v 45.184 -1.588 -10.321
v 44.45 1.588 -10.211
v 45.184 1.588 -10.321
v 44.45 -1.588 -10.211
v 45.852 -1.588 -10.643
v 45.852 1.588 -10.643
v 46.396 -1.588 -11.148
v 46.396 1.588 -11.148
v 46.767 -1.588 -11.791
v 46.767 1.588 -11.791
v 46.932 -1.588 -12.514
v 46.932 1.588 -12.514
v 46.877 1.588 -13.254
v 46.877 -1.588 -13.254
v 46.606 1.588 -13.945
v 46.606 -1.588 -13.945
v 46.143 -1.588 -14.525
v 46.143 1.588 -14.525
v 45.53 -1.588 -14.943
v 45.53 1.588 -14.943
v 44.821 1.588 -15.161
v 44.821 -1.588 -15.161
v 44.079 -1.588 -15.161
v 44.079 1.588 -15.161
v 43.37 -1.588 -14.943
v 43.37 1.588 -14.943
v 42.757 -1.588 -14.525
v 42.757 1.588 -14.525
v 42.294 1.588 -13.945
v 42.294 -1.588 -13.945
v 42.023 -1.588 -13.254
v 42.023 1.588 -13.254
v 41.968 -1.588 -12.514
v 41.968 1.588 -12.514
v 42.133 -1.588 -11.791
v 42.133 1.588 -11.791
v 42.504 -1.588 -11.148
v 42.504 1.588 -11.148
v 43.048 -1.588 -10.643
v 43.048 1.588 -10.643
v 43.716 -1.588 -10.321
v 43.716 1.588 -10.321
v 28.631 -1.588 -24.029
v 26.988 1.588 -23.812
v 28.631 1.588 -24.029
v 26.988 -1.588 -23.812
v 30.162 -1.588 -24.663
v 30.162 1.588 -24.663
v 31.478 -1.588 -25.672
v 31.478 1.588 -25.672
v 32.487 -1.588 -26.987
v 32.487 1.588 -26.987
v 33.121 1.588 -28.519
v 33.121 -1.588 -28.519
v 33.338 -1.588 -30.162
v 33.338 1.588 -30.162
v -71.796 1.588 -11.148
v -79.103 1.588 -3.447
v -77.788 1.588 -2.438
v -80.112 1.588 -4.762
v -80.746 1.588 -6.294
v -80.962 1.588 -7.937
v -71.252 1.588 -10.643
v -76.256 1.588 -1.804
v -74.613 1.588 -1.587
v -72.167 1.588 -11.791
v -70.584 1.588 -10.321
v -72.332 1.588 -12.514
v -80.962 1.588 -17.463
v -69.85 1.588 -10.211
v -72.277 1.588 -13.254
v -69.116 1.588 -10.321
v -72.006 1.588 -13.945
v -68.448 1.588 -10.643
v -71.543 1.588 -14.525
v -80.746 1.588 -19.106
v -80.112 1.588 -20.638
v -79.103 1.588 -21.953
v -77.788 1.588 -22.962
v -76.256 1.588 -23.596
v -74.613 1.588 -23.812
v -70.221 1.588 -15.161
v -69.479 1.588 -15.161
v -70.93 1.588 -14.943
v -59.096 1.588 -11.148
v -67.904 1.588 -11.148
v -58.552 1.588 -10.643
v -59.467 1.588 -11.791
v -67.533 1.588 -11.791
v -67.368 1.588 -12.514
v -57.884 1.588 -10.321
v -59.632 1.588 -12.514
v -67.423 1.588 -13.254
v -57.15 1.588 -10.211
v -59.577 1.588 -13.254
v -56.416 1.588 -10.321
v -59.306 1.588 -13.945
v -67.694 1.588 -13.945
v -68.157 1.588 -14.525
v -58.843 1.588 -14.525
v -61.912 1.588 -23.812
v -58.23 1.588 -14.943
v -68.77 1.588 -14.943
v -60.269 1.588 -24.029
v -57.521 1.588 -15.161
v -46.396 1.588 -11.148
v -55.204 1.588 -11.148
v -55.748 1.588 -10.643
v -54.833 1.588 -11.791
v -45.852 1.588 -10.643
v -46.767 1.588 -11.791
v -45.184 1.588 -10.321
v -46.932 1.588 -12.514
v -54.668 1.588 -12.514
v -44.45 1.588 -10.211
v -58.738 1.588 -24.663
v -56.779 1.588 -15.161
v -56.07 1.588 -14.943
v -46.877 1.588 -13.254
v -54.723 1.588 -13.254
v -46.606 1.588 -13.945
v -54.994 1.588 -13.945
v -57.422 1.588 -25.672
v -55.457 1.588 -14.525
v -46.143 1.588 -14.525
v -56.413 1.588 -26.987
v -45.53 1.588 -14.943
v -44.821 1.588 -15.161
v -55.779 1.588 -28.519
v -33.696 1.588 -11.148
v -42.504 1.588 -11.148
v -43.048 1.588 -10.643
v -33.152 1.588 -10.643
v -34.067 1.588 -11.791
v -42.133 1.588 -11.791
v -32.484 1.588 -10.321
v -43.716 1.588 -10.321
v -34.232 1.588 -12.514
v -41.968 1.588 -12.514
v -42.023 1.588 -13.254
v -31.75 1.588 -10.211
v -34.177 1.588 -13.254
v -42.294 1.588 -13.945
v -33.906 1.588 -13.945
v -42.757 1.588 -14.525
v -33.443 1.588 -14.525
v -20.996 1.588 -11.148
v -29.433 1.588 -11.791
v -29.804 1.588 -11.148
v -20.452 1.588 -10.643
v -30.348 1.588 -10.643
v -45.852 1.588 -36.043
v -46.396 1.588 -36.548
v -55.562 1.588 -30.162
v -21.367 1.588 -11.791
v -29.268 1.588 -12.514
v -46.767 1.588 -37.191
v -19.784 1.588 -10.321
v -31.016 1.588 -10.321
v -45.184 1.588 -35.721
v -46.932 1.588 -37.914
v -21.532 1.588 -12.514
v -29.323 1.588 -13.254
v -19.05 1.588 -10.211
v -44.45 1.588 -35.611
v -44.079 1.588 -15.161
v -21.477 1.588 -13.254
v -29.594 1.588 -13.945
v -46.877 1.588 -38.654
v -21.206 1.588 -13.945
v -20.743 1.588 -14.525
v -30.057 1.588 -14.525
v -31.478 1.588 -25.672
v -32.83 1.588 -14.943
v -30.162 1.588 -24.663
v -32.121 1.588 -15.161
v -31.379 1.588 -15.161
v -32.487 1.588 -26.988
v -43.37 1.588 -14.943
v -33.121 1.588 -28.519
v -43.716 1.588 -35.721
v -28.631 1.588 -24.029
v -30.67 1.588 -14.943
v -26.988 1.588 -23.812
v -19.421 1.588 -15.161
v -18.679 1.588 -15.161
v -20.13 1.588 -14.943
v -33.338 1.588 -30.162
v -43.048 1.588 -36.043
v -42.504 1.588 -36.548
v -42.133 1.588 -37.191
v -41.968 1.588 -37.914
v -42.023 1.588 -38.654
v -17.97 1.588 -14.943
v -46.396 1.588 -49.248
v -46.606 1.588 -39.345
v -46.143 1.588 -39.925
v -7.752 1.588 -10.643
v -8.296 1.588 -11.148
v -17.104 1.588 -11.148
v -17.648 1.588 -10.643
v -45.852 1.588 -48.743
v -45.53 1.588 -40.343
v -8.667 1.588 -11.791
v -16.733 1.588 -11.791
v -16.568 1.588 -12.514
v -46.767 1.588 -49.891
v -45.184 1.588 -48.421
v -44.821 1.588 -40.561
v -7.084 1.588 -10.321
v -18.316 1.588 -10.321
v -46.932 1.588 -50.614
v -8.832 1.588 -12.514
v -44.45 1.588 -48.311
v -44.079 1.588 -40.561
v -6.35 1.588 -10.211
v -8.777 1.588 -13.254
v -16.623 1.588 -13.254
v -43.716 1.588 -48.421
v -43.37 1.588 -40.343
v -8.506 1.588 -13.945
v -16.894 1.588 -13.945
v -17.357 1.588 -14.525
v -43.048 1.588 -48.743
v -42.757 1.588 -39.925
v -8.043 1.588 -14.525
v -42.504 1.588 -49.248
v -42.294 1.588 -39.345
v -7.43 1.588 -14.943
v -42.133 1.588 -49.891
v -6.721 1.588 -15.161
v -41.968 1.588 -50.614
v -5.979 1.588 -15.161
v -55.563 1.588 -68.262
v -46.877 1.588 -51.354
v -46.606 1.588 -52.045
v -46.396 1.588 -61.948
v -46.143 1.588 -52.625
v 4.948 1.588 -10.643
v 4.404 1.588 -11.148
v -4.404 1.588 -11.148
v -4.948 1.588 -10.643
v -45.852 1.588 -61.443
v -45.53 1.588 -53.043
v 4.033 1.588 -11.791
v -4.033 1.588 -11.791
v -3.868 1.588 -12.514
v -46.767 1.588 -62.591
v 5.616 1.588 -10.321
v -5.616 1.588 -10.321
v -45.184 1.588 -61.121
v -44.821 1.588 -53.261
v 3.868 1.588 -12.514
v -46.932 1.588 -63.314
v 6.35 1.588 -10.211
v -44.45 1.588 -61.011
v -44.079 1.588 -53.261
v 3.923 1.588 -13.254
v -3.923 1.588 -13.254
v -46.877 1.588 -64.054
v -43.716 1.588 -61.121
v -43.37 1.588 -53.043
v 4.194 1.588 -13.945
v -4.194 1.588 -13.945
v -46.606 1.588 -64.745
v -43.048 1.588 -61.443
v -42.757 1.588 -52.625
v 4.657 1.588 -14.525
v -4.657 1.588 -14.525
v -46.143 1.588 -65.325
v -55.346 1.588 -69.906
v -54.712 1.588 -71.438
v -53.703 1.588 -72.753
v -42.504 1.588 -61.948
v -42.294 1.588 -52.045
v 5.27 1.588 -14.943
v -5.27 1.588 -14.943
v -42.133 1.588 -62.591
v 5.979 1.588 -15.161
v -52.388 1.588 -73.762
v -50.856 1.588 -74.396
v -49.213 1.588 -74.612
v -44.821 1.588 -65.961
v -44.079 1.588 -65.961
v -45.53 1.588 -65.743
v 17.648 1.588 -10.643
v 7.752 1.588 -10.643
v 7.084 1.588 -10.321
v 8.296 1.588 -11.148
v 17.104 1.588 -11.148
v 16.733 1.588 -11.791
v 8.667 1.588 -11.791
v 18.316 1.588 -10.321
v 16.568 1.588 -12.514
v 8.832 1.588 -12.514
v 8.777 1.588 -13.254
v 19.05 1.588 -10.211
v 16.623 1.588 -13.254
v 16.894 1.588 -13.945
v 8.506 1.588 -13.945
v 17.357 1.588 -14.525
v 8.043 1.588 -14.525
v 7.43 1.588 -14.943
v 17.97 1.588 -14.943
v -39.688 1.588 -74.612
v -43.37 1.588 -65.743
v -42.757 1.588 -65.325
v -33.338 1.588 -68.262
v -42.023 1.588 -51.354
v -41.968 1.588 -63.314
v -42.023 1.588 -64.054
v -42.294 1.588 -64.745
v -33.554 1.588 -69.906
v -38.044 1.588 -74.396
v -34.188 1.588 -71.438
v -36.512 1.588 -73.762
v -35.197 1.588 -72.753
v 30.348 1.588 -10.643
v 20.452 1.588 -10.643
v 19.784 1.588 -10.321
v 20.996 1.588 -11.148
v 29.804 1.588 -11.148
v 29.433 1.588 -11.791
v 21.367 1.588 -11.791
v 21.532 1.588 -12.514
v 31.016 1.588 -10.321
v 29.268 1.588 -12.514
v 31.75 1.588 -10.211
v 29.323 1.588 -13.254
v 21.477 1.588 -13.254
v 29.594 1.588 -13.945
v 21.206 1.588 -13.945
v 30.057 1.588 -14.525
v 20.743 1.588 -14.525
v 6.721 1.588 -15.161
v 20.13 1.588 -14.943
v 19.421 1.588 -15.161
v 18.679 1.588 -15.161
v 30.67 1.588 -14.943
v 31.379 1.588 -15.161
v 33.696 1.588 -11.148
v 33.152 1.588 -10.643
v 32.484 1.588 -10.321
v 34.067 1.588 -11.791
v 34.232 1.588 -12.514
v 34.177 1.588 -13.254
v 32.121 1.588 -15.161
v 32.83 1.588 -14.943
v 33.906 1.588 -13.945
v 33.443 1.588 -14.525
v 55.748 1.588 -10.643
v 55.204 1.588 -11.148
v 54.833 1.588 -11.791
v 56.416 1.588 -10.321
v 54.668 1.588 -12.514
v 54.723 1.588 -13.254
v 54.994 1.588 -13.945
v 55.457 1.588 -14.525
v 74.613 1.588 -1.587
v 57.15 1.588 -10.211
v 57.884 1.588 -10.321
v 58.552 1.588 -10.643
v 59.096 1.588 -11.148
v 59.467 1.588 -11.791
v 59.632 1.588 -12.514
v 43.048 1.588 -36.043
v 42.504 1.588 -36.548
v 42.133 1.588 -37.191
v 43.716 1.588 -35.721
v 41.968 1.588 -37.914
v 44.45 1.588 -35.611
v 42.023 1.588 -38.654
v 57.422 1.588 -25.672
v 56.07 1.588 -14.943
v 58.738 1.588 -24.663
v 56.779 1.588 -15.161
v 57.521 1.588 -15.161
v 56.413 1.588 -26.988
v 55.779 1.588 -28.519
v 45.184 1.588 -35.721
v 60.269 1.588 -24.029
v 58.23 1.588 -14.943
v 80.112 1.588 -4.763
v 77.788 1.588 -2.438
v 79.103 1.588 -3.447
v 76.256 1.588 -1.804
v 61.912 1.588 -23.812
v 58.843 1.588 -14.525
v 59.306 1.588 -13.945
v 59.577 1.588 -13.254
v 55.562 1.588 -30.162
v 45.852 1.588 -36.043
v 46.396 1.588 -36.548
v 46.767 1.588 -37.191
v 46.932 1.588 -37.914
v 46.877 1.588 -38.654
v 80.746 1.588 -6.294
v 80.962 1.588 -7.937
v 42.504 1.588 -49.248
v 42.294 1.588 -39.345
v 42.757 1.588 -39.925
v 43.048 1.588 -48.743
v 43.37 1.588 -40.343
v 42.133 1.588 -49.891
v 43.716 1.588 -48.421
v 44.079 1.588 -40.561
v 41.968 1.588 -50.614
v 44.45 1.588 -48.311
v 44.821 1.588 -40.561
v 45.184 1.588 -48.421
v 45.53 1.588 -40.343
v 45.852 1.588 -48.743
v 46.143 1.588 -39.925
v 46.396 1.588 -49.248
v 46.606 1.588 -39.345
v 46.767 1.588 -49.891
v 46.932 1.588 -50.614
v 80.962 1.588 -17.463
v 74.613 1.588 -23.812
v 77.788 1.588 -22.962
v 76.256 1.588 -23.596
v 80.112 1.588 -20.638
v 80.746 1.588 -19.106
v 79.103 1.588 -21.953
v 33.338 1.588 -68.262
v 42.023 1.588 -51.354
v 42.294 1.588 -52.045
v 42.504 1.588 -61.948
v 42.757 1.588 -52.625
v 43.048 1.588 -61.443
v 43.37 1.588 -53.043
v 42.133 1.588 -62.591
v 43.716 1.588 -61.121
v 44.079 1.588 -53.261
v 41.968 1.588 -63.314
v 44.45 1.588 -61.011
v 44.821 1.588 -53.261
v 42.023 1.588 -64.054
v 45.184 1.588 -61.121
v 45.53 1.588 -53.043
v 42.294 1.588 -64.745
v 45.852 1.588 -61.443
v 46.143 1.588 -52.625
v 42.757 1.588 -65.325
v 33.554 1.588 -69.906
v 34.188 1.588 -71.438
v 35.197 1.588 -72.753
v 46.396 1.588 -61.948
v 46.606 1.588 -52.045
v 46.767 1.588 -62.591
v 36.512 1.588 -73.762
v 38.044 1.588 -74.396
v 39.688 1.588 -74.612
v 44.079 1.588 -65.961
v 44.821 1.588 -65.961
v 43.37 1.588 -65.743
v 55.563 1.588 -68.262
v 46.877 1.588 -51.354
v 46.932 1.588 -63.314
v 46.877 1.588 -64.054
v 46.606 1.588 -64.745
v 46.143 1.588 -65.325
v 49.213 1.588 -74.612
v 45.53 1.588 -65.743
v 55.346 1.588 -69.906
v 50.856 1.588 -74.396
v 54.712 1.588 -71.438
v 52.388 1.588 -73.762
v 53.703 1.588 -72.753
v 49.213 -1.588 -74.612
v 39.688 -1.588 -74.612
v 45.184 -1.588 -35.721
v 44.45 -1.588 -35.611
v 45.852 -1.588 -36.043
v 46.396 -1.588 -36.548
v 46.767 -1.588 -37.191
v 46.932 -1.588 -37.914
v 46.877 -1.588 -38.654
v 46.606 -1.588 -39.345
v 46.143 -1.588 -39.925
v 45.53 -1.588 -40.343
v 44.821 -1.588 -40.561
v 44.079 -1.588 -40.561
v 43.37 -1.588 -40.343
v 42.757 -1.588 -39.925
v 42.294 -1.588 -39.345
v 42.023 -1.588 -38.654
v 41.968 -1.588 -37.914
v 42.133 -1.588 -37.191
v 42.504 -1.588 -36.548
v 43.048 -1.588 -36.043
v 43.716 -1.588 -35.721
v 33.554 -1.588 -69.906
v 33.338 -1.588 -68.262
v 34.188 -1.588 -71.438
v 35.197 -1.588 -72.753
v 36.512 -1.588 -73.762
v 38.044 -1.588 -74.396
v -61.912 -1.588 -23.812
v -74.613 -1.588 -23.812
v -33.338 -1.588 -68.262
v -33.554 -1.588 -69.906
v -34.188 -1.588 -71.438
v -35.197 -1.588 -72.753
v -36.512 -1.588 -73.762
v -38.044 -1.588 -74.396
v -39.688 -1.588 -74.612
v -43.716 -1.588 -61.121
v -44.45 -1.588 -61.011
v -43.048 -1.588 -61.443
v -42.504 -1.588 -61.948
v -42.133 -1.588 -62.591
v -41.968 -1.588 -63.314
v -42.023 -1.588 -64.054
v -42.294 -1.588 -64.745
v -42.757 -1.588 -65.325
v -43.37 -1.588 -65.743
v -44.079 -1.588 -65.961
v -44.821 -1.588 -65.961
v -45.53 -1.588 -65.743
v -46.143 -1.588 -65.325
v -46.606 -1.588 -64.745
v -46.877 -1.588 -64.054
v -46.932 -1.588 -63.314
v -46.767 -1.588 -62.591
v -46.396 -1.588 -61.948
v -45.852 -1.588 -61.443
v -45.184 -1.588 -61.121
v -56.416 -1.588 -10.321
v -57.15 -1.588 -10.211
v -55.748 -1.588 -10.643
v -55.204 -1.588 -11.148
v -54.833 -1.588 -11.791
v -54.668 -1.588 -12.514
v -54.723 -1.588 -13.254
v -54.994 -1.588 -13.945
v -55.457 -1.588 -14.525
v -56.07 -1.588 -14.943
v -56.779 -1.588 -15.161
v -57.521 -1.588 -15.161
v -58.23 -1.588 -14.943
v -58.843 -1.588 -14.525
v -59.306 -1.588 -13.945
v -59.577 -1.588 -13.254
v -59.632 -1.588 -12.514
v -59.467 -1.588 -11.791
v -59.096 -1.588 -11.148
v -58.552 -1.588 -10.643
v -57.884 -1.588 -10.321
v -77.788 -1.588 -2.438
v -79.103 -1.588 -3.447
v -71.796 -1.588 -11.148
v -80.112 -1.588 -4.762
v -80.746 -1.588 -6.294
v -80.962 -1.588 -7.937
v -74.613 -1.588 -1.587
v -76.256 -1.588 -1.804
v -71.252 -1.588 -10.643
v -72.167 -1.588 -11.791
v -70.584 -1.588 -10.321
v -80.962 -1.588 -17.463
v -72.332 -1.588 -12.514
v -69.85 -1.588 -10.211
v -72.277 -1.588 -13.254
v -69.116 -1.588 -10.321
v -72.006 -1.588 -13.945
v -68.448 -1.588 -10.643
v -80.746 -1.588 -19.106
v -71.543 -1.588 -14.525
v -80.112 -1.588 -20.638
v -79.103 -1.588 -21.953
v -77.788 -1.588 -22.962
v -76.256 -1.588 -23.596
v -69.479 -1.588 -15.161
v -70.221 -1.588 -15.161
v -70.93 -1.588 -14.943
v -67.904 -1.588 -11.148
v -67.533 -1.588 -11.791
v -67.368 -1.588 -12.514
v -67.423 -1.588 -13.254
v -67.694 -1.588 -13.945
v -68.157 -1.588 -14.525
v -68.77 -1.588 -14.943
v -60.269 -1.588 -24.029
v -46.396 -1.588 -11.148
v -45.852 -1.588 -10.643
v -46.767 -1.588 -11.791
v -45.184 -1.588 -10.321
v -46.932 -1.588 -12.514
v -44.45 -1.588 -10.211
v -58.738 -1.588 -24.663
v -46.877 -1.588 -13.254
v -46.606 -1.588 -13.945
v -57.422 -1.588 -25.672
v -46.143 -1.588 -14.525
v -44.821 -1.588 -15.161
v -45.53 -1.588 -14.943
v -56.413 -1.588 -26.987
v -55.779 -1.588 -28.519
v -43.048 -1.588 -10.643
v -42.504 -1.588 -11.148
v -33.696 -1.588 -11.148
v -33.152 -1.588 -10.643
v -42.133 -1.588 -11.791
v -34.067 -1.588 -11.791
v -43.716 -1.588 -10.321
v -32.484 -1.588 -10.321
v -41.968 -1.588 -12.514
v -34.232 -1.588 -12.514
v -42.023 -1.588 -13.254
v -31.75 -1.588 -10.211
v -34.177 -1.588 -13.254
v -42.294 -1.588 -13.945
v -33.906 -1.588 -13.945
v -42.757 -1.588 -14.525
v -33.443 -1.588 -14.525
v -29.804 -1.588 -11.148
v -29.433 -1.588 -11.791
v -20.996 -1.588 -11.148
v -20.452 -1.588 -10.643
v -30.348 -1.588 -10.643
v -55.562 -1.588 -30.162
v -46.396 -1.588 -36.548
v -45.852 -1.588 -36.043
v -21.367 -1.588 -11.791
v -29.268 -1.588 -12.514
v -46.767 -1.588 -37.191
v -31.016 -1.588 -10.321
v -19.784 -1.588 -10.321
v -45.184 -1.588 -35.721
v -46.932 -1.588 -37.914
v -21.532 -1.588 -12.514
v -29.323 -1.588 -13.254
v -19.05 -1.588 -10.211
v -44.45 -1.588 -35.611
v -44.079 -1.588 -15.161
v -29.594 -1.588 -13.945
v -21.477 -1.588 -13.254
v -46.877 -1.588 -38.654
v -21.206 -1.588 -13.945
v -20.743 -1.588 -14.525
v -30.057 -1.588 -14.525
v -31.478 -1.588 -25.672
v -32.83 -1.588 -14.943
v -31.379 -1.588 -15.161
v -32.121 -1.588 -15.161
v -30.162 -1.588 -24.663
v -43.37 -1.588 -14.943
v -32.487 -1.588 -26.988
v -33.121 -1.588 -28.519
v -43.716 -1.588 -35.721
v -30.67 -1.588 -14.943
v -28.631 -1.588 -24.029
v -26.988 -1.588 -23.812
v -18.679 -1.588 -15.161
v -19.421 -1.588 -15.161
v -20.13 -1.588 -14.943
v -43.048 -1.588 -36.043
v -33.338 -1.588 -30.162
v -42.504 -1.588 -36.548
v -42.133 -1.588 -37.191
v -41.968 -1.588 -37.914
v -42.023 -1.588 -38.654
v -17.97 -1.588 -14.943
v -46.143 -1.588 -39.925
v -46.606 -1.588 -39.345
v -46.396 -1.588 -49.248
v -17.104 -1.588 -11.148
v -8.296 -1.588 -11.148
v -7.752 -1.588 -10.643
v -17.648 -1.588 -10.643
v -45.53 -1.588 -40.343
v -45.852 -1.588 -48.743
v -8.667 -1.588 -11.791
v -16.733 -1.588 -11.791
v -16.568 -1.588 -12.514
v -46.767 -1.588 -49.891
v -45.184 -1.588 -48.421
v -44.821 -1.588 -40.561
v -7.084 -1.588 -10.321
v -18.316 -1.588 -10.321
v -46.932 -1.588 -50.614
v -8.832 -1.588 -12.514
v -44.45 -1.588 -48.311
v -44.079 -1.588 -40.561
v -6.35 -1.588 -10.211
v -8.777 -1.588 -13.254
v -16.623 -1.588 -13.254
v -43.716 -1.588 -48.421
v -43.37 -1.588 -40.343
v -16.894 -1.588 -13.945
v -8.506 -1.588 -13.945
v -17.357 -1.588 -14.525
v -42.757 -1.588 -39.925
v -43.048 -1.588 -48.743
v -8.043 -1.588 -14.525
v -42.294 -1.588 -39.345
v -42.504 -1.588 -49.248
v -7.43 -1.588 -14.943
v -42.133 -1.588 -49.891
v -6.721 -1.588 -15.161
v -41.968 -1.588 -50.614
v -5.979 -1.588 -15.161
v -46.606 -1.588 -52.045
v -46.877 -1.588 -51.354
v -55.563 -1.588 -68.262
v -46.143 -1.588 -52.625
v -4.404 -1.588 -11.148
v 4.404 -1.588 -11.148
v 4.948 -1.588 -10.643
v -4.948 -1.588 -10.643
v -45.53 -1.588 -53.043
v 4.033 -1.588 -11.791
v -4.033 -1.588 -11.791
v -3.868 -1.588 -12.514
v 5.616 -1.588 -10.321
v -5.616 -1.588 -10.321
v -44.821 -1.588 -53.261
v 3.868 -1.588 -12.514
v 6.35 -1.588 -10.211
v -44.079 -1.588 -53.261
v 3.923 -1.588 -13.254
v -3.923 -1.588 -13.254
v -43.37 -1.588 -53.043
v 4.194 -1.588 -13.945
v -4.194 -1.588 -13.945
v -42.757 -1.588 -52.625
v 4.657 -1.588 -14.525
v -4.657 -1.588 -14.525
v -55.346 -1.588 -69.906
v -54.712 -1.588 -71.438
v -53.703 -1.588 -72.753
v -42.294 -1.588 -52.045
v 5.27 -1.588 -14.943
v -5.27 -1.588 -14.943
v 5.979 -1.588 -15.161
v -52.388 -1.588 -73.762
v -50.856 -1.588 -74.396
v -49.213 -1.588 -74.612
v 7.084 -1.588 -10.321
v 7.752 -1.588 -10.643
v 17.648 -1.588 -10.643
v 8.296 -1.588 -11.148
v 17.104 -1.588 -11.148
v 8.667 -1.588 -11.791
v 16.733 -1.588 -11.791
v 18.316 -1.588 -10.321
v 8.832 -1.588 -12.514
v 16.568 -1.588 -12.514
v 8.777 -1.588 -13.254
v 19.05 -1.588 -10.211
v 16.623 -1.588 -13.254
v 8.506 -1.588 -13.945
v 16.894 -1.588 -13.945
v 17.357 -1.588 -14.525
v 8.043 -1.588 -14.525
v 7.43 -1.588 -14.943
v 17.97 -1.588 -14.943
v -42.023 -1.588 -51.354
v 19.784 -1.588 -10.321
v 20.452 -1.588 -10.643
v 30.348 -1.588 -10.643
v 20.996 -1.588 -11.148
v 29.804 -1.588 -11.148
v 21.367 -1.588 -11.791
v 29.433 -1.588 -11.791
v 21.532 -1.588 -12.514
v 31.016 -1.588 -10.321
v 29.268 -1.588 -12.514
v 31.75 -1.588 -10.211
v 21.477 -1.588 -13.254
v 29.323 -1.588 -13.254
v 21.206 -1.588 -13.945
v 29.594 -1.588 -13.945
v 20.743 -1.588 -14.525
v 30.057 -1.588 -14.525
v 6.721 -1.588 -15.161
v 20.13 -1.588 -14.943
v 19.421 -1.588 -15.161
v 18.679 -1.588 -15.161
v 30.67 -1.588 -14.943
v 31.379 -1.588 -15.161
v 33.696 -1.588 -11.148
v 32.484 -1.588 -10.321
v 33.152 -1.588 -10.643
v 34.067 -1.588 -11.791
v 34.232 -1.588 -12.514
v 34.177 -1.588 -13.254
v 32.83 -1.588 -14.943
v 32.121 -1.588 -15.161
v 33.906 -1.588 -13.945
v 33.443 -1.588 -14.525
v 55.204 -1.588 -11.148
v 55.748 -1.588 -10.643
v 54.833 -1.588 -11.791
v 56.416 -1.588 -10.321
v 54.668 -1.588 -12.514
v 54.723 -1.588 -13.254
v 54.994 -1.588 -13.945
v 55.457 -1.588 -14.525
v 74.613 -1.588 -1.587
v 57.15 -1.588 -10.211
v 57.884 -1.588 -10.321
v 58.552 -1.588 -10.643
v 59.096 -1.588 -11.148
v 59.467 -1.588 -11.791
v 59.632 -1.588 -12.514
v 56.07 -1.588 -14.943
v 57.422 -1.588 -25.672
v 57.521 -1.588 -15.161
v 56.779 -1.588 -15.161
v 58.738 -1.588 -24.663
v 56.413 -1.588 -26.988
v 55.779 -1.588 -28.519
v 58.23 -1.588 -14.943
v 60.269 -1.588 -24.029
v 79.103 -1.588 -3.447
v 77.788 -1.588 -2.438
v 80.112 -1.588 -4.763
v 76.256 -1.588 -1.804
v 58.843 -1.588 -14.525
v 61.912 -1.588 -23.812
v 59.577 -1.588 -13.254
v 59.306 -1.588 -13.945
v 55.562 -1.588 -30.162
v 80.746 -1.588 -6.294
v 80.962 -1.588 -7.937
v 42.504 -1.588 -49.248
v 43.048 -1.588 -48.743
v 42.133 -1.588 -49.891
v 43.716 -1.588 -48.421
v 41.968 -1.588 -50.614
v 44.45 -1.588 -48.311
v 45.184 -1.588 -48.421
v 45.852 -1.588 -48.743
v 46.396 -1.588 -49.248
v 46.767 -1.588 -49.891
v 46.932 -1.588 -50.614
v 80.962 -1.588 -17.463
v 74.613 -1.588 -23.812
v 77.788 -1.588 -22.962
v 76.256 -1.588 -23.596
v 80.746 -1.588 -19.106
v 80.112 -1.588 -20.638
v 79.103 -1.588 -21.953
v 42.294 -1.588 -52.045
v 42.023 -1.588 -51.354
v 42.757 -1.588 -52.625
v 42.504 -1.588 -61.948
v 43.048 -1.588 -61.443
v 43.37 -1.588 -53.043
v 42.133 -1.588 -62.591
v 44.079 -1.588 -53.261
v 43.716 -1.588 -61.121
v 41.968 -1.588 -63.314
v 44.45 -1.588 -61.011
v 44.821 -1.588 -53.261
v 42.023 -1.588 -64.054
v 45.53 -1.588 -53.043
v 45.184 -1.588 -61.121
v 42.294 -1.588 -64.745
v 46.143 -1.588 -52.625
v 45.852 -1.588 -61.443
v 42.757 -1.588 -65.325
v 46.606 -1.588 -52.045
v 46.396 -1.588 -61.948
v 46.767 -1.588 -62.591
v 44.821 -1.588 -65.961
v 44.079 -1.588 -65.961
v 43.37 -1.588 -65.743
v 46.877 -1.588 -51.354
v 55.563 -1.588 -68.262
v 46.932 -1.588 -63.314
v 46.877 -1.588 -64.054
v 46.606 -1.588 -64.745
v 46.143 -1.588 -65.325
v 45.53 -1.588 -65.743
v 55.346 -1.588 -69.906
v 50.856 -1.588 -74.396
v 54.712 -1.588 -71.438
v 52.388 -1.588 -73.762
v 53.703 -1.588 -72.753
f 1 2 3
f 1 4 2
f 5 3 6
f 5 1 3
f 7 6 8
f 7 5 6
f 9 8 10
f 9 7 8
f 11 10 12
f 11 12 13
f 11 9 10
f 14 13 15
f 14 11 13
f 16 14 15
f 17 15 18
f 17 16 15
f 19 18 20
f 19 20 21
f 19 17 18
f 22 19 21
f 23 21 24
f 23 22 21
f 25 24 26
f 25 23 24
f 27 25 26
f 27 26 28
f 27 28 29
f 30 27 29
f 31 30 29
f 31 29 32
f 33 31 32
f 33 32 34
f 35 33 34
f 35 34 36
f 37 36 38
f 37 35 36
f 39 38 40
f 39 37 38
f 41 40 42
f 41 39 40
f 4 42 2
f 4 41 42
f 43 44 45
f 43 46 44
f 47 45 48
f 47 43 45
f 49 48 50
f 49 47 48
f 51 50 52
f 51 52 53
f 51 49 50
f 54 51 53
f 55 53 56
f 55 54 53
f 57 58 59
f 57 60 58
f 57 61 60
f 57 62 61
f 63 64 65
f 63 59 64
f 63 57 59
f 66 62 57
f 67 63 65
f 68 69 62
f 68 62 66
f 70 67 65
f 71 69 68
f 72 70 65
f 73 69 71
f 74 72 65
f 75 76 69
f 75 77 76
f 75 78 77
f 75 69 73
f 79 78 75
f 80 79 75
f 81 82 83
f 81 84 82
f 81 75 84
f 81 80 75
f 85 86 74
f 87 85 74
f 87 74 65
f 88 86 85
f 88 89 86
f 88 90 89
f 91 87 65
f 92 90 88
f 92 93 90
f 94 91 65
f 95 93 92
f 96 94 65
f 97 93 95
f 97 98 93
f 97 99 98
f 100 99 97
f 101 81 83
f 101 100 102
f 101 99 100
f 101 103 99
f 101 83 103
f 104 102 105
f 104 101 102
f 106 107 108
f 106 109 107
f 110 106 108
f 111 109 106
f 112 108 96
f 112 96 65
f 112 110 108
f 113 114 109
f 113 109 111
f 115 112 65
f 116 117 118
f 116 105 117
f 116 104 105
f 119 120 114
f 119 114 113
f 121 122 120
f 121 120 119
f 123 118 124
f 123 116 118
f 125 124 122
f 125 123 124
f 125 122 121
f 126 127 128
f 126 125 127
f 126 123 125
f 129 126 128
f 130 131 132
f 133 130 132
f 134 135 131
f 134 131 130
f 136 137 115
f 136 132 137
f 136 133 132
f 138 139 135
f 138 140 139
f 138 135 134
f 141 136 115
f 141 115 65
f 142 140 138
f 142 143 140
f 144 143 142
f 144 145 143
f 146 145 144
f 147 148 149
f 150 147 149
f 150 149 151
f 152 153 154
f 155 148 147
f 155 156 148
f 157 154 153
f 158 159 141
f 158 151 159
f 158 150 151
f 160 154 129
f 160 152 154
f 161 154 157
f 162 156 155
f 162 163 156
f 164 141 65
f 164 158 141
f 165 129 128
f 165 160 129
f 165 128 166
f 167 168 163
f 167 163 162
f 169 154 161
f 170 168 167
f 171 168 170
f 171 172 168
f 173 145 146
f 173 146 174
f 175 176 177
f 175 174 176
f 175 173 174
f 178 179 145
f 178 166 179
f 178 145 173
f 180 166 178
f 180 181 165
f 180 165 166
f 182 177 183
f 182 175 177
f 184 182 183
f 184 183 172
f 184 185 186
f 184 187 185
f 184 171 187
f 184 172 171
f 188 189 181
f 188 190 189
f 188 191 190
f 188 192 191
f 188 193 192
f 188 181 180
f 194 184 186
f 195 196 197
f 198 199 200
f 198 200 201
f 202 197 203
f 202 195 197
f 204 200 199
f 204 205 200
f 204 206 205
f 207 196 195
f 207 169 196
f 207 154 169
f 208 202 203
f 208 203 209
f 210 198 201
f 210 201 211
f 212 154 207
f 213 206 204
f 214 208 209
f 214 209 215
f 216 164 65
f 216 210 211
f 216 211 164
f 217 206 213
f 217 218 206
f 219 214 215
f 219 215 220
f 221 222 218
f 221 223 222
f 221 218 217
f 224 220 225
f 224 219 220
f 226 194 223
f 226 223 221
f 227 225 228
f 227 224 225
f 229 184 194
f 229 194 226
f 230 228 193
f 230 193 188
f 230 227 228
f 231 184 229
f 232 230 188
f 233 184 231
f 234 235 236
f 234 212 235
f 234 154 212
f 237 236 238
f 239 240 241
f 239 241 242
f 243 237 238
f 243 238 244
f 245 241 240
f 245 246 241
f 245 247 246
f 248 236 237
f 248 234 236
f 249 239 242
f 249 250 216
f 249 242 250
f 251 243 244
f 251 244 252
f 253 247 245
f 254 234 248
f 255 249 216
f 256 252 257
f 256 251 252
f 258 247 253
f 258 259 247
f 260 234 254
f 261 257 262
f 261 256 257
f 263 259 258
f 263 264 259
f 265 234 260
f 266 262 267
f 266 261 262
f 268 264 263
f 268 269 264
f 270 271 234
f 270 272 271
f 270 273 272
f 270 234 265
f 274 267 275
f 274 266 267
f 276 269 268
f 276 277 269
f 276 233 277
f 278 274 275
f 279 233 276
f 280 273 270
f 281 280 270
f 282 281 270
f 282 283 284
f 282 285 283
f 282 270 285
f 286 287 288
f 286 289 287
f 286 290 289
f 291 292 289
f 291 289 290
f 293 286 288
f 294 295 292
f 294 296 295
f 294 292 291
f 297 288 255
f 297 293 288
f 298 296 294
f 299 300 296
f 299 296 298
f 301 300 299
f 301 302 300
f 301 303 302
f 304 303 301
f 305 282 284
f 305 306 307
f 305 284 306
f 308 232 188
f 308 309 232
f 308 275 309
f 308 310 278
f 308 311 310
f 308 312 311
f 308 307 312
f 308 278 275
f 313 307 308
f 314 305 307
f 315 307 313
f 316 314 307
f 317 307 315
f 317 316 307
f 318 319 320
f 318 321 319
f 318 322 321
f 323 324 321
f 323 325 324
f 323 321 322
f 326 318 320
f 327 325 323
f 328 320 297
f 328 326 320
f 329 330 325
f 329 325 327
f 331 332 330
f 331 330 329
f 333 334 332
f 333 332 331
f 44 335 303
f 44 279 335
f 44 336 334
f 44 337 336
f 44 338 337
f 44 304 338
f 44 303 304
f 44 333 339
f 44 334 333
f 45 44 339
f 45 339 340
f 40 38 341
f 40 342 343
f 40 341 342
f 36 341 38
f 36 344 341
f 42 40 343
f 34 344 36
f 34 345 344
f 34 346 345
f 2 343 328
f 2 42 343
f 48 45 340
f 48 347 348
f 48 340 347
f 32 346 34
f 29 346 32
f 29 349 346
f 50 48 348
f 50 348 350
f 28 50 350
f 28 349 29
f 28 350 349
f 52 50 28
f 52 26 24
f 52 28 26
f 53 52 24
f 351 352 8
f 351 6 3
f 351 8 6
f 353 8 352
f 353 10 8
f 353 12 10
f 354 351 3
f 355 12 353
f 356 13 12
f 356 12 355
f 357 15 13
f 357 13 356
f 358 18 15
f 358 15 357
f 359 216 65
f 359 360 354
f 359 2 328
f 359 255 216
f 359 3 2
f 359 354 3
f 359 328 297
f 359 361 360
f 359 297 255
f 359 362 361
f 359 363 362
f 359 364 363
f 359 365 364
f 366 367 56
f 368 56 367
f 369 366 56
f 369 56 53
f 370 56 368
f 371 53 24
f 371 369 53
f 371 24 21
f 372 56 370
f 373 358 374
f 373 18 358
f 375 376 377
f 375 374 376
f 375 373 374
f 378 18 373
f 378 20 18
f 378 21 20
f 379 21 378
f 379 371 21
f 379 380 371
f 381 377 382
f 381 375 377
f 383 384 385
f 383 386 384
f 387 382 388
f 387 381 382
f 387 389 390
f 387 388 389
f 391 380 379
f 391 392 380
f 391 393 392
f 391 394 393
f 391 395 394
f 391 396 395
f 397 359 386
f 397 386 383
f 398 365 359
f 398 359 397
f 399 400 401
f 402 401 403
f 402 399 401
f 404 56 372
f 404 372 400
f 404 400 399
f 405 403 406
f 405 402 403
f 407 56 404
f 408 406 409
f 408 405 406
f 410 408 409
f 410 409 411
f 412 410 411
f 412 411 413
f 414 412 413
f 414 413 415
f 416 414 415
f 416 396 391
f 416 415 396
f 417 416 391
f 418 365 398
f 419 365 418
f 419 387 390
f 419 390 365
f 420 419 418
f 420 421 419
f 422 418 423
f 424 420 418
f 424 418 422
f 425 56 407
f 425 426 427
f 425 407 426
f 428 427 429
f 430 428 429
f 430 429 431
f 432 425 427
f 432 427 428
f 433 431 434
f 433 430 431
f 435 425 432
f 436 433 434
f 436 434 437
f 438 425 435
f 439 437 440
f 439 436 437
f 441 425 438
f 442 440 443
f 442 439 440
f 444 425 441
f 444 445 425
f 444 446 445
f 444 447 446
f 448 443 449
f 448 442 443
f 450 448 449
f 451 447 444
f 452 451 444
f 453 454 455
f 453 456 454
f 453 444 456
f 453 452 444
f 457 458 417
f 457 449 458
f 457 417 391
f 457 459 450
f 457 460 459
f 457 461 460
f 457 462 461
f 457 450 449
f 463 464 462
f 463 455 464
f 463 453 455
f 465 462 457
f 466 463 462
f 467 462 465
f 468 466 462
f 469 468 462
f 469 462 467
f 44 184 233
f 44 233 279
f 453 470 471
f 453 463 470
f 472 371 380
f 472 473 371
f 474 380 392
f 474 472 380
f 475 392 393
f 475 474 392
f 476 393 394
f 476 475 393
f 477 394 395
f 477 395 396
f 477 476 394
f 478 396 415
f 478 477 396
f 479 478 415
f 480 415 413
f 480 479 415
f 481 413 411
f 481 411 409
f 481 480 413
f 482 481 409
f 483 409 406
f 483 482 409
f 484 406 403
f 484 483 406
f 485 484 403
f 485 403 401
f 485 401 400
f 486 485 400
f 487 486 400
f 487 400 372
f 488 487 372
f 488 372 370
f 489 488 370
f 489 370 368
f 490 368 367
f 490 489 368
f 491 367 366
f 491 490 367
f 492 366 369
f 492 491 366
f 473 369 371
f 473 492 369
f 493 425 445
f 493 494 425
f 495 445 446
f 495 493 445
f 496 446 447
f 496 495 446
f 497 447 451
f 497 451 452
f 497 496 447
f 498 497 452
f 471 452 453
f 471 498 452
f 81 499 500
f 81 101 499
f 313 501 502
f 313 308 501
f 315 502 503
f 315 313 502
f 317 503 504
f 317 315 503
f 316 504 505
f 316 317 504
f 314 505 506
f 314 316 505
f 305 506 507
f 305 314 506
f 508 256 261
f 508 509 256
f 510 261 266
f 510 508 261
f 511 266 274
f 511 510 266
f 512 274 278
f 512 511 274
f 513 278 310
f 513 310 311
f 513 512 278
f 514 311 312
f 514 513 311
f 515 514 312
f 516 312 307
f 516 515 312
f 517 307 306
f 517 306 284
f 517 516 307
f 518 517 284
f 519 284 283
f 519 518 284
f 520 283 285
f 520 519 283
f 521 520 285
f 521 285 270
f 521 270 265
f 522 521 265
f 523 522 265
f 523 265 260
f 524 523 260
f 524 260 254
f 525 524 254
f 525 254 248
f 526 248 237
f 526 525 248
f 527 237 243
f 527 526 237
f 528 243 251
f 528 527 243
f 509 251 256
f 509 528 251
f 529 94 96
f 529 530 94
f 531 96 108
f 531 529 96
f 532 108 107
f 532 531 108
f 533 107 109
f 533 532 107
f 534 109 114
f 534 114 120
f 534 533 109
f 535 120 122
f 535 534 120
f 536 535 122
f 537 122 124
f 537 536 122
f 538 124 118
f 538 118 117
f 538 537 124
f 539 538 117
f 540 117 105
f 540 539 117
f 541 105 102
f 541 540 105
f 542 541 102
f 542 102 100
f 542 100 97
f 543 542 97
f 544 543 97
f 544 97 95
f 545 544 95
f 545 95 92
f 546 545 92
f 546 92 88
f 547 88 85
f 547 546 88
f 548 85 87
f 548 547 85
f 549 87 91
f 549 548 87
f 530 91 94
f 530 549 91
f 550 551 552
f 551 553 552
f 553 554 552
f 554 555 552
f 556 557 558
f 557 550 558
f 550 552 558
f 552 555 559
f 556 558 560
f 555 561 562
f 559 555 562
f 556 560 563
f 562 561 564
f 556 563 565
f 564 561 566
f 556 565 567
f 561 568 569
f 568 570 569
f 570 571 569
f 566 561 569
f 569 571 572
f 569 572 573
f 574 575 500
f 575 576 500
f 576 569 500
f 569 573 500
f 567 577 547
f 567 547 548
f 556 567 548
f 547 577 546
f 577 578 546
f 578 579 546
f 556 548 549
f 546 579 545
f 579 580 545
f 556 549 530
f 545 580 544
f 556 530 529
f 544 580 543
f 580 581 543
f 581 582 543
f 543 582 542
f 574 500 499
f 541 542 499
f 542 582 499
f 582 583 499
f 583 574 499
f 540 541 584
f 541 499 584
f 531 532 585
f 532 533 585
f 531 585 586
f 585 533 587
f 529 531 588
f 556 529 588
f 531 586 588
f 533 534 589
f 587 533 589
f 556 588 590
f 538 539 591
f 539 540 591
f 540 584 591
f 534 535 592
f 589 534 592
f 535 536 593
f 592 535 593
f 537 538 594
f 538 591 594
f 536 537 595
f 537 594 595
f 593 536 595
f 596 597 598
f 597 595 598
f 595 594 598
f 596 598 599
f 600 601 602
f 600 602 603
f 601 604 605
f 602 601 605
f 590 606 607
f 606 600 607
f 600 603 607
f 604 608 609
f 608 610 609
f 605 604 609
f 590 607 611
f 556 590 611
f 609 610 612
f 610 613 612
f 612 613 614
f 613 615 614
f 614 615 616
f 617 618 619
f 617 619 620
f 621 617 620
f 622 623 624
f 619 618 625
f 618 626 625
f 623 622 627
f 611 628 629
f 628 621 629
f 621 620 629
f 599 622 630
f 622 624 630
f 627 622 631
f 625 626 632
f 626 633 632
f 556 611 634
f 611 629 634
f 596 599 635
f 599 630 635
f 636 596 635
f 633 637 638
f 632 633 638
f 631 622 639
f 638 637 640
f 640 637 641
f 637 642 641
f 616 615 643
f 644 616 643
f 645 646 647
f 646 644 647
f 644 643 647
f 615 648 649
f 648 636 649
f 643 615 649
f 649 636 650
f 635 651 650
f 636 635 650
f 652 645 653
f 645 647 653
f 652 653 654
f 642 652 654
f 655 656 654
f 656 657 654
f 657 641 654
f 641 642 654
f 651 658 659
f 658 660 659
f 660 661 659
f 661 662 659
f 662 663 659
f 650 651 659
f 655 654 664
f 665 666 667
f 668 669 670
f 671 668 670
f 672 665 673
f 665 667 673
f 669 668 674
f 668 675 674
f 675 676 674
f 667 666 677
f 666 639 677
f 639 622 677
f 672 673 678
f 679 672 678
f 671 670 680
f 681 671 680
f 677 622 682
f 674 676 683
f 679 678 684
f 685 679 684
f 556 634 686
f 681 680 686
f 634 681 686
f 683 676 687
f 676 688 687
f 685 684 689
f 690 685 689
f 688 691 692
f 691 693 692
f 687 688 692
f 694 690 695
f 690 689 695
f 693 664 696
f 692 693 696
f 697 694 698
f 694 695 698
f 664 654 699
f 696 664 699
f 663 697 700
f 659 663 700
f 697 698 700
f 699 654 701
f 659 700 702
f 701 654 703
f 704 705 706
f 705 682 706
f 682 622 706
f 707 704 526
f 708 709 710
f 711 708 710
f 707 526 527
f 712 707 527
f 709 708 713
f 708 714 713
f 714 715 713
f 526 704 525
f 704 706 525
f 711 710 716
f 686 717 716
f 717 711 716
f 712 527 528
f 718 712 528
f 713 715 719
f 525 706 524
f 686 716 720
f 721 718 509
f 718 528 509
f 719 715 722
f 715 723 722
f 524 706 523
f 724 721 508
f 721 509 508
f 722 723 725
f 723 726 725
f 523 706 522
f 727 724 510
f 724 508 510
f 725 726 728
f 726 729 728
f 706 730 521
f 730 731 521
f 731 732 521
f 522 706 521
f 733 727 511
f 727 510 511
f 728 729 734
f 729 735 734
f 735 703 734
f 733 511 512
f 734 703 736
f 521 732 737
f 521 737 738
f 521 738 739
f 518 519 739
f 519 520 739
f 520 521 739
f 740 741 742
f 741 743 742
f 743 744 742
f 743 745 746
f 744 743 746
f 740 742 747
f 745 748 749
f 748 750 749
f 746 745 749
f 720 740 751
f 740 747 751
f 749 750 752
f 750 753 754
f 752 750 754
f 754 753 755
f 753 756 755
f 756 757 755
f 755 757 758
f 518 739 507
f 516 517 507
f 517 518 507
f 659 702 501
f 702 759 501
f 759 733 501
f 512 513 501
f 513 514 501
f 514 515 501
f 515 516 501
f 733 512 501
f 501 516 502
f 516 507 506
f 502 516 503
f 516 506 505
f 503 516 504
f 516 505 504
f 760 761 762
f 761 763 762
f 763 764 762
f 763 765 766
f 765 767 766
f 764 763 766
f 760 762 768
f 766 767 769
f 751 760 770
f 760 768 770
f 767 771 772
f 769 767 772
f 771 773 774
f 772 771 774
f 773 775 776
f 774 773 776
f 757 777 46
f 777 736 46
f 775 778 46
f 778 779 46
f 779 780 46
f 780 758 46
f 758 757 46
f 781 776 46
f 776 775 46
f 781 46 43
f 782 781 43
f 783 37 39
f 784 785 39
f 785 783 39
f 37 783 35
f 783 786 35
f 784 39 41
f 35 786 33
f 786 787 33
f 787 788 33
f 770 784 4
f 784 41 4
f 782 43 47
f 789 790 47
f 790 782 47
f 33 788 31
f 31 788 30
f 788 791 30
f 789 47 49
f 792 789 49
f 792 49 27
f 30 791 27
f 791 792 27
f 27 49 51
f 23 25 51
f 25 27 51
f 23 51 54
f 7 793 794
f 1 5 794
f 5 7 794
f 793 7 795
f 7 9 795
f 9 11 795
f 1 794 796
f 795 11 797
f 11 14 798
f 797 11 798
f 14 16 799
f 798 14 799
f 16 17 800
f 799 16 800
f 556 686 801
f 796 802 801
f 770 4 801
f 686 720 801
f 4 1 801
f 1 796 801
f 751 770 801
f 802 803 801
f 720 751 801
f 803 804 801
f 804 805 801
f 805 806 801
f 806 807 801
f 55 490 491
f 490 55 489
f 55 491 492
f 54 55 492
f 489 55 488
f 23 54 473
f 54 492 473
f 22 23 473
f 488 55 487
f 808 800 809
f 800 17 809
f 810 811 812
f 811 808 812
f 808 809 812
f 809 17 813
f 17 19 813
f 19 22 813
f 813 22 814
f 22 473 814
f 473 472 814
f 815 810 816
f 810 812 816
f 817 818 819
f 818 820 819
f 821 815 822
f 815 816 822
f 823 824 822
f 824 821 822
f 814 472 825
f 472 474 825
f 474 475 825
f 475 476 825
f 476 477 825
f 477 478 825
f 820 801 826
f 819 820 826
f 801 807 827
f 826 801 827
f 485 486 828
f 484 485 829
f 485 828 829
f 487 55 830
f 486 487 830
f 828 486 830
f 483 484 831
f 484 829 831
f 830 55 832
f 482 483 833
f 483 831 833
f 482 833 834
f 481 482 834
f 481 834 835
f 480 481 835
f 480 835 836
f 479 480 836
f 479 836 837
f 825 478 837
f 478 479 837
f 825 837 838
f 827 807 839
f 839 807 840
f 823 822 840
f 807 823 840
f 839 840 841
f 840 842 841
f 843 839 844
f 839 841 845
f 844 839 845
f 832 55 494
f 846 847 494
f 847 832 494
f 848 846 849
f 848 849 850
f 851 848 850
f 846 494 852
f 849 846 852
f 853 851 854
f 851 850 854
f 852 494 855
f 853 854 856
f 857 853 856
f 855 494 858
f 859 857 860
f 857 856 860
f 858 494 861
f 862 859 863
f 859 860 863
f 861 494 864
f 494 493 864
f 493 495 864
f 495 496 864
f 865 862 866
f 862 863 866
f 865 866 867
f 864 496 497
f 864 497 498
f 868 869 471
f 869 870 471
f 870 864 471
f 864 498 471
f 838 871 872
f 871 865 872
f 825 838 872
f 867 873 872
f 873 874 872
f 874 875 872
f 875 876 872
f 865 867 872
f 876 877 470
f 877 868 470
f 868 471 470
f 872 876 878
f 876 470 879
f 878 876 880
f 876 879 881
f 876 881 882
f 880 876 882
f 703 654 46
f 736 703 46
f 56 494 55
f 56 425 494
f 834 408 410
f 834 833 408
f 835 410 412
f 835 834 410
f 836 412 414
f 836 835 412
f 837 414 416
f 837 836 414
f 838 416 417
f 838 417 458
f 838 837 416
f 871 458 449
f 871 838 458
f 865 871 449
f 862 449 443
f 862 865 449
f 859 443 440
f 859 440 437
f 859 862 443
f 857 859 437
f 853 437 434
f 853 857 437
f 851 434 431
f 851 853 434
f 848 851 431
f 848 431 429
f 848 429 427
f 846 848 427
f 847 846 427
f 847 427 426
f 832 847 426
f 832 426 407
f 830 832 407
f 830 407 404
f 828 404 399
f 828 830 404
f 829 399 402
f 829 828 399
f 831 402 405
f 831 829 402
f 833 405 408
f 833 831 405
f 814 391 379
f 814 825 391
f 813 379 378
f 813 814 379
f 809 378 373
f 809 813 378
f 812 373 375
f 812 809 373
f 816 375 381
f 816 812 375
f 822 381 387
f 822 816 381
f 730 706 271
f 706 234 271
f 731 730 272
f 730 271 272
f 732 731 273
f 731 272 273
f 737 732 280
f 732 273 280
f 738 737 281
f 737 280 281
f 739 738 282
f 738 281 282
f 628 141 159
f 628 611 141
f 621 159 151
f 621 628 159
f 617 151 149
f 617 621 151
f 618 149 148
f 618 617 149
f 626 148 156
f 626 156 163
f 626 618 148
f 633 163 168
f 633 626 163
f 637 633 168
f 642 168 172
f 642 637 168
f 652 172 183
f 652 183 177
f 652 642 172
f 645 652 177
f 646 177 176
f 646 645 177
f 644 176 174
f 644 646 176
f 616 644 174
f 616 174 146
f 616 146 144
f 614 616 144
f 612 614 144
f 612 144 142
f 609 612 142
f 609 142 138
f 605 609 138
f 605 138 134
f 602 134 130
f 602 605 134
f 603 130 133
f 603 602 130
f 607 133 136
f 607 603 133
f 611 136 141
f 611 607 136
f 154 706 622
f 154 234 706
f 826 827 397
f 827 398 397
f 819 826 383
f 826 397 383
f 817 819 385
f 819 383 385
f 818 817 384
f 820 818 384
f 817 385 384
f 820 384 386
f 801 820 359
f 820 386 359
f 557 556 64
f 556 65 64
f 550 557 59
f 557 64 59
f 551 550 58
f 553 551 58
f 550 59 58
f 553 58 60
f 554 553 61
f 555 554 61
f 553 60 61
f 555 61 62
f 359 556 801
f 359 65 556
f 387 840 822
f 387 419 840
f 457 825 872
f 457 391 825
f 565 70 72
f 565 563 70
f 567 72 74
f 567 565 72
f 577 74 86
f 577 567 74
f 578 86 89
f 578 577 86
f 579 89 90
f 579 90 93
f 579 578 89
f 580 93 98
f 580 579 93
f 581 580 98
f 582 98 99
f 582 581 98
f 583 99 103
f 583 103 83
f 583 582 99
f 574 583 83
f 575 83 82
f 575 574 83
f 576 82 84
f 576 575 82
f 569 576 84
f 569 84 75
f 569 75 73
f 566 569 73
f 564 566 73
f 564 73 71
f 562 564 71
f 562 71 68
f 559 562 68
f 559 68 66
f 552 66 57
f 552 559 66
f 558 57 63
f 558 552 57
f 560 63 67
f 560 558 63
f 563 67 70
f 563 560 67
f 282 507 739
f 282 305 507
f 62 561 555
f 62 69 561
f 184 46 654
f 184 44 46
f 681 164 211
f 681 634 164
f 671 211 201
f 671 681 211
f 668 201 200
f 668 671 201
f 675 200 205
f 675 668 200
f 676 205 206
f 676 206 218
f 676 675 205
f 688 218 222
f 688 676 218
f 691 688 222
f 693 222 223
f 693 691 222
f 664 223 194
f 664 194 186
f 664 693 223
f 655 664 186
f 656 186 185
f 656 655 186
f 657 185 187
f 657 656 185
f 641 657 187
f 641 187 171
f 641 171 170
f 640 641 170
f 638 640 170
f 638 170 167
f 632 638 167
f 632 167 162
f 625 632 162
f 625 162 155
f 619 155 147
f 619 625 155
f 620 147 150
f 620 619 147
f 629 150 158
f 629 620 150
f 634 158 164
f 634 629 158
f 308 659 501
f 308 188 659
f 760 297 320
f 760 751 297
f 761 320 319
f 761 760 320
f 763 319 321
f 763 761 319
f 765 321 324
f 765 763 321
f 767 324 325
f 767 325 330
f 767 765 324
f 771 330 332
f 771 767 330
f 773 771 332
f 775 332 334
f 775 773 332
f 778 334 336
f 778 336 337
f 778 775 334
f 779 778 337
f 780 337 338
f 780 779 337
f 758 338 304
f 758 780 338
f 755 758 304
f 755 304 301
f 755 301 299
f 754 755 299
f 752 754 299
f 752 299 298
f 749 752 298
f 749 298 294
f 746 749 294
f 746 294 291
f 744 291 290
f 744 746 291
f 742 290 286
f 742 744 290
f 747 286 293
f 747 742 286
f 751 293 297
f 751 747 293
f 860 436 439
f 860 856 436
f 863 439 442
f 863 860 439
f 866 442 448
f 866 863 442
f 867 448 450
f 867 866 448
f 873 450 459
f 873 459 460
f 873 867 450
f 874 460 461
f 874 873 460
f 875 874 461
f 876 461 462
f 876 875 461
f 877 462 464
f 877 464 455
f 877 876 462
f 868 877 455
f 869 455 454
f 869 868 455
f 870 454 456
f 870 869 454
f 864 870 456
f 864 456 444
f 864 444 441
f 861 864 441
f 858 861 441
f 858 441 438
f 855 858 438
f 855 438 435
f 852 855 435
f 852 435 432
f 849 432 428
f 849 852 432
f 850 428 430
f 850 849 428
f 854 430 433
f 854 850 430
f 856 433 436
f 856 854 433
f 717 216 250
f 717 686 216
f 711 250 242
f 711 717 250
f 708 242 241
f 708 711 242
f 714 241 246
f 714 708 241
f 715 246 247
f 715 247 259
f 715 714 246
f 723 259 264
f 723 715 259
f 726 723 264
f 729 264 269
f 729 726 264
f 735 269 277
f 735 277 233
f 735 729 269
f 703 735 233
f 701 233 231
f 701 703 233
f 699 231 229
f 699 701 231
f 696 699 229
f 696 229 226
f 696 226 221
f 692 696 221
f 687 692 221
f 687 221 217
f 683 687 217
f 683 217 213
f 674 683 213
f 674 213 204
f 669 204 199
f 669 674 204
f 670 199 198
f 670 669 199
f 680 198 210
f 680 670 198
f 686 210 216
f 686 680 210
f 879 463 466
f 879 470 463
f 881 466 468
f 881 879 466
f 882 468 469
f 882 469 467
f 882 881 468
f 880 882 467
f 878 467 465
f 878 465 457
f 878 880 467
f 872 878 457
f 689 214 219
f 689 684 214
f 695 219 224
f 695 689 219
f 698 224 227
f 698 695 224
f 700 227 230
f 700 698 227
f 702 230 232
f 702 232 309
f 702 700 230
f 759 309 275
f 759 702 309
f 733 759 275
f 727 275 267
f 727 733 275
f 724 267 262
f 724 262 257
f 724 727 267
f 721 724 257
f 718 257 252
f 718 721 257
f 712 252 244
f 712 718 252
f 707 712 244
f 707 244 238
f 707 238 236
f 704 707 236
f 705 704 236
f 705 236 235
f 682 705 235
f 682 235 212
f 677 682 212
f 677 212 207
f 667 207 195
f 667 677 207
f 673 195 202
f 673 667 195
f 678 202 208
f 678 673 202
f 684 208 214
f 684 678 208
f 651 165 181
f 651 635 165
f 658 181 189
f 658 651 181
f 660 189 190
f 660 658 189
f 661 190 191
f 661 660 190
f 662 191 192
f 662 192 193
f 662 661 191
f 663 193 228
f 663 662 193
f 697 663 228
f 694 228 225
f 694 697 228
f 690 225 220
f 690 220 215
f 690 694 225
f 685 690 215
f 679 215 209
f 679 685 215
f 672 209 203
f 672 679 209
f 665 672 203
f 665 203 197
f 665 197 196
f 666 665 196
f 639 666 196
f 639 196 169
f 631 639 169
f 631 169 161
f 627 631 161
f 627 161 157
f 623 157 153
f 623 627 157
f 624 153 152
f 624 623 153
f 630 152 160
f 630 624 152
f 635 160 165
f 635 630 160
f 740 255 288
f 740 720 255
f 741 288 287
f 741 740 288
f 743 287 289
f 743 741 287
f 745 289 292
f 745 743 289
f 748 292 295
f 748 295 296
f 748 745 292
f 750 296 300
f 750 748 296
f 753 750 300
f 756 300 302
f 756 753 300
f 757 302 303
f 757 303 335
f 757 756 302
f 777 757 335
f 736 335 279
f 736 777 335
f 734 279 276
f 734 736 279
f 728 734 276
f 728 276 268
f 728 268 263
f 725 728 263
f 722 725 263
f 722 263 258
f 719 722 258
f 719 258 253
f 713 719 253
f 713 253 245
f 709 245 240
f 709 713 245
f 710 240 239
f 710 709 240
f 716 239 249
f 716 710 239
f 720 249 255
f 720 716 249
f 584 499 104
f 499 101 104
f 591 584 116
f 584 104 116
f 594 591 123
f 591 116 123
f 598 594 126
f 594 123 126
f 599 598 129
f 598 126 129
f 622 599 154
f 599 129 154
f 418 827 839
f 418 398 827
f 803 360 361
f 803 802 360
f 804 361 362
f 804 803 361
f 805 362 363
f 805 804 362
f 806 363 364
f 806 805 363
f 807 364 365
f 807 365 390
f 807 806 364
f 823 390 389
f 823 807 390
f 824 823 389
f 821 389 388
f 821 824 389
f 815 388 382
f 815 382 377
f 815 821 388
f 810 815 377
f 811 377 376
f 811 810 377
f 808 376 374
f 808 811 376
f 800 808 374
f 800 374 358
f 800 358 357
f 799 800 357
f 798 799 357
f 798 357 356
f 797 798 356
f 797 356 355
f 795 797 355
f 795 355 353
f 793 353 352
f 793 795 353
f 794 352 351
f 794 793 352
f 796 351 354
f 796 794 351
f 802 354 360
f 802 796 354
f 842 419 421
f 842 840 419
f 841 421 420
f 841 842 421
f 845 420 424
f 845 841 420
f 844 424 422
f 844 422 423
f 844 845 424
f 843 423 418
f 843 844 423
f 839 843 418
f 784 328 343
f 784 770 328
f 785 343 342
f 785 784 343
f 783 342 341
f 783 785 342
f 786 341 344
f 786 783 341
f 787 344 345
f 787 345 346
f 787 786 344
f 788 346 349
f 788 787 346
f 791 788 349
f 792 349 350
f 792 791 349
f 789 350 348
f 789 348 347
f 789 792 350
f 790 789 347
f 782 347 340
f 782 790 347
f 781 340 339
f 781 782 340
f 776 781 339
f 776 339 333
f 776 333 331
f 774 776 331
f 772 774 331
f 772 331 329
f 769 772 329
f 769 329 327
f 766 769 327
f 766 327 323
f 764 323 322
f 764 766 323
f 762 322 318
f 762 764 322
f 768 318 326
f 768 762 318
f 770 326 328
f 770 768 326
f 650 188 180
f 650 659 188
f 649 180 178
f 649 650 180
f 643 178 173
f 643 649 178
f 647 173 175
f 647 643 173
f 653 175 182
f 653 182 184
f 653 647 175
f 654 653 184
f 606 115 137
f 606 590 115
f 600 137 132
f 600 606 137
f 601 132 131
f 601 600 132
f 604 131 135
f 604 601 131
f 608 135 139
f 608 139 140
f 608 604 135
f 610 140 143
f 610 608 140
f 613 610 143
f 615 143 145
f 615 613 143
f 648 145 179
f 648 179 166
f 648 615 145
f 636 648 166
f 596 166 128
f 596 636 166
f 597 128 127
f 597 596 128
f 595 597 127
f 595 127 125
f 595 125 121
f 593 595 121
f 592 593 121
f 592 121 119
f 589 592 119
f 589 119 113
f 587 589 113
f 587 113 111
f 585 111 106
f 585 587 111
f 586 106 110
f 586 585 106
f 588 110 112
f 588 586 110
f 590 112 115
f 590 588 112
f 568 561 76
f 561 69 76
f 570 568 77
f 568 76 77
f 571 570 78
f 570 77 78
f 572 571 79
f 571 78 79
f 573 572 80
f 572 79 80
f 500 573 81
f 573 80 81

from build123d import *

# Parameters (mm, degrees)
SKETCH1_R           = 2.4892
BOSS_EXTRUDE1_DEPTH = 1.5875
FILLET1_R           = 6.35


with BuildPart() as part:
    # Sketch1 → Boss-Extrude1 (new, symmetric)
    with BuildSketch(Plane(origin=(0, 0, 0), x_dir=(1, 0, 0), z_dir=(0, 1, 0))):
        Polygon((-33.3375, 23.8125), (-33.3375, 74.6125), (-55.5625, 74.6125), (-55.5625, 23.8125), (-80.9625, 23.8125), (-80.9625, 1.5875), (80.9625, 1.5875), (80.9625, 23.8125), (55.5625, 23.8125), (55.5625, 74.6125), (33.3375, 74.6125), (33.3375, 23.8125), align=None)
        with Locations(Location((44.45, 50.8, 0), (0, 0, 270))):
            Circle(SKETCH1_R, mode=Mode.SUBTRACT)
        with Locations(Location((-69.85, 12.7, 0), (0, 0, 270))):
            Circle(SKETCH1_R, mode=Mode.SUBTRACT)
        with Locations(Location((-57.15, 12.7, 0), (0, 0, 270))):
            Circle(SKETCH1_R, mode=Mode.SUBTRACT)
        with Locations(Location((-44.45, 12.7, 0), (0, 0, 270))):
            Circle(SKETCH1_R, mode=Mode.SUBTRACT)
        with Locations(Location((-31.75, 12.7, 0), (0, 0, 270))):
            Circle(SKETCH1_R, mode=Mode.SUBTRACT)
        with Locations(Location((-19.05, 12.7, 0), (0, 0, 270))):
            Circle(SKETCH1_R, mode=Mode.SUBTRACT)
        with Locations(Location((-6.35, 12.7, 0), (0, 0, 270))):
            Circle(SKETCH1_R, mode=Mode.SUBTRACT)
        with Locations(Location((6.35, 12.7, 0), (0, 0, 270))):
            Circle(SKETCH1_R, mode=Mode.SUBTRACT)
        with Locations(Location((19.05, 12.7, 0), (0, 0, 270))):
            Circle(SKETCH1_R, mode=Mode.SUBTRACT)
        with Locations(Location((31.75, 12.7, 0), (0, 0, 270))):
            Circle(SKETCH1_R, mode=Mode.SUBTRACT)
        with Locations(Location((44.45, 12.7, 0), (0, 0, 270))):
            Circle(SKETCH1_R, mode=Mode.SUBTRACT)
        with Locations(Location((57.15, 12.7, 0), (0, 0, 270))):
            Circle(SKETCH1_R, mode=Mode.SUBTRACT)
        with Locations(Location((-44.45, 38.1, 0), (0, 0, 270))):
            Circle(SKETCH1_R, mode=Mode.SUBTRACT)
        with Locations(Location((-44.45, 50.8, 0), (0, 0, 270))):
            Circle(SKETCH1_R, mode=Mode.SUBTRACT)
        with Locations(Location((-44.45, 63.5, 0), (0, 0, 270))):
            Circle(SKETCH1_R, mode=Mode.SUBTRACT)
        with Locations(Location((44.45, 38.1, 0), (0, 0, 270))):
            Circle(SKETCH1_R, mode=Mode.SUBTRACT)
        with Locations(Location((44.45, 63.5, 0), (0, 0, 270))):
            Circle(SKETCH1_R, mode=Mode.SUBTRACT)
    extrude(amount=BOSS_EXTRUDE1_DEPTH, both=True)

    # Fillet1
    fillet1_edges = [part.edges().sort_by_distance(p)[0] for p in [
        (-33.3375, 0, -23.8125),
        (33.3375, 0, -23.8125),
        (33.3375, 0, -74.6125),
        (55.5625, 0, -74.6125),
        (55.5625, 0, -23.8125),
        (80.9625, 0, -23.8125),
        (80.9625, 0, -1.5875),
        (-80.9625, 0, -1.5875),
        (-80.9625, 0, -23.8125),
        (-55.5625, 0, -23.8125),
        (-55.5625, 0, -74.6125),
        (-33.3375, 0, -74.6125),
    ]]
    fillet(fillet1_edges, radius=FILLET1_R)


solid = part.part
